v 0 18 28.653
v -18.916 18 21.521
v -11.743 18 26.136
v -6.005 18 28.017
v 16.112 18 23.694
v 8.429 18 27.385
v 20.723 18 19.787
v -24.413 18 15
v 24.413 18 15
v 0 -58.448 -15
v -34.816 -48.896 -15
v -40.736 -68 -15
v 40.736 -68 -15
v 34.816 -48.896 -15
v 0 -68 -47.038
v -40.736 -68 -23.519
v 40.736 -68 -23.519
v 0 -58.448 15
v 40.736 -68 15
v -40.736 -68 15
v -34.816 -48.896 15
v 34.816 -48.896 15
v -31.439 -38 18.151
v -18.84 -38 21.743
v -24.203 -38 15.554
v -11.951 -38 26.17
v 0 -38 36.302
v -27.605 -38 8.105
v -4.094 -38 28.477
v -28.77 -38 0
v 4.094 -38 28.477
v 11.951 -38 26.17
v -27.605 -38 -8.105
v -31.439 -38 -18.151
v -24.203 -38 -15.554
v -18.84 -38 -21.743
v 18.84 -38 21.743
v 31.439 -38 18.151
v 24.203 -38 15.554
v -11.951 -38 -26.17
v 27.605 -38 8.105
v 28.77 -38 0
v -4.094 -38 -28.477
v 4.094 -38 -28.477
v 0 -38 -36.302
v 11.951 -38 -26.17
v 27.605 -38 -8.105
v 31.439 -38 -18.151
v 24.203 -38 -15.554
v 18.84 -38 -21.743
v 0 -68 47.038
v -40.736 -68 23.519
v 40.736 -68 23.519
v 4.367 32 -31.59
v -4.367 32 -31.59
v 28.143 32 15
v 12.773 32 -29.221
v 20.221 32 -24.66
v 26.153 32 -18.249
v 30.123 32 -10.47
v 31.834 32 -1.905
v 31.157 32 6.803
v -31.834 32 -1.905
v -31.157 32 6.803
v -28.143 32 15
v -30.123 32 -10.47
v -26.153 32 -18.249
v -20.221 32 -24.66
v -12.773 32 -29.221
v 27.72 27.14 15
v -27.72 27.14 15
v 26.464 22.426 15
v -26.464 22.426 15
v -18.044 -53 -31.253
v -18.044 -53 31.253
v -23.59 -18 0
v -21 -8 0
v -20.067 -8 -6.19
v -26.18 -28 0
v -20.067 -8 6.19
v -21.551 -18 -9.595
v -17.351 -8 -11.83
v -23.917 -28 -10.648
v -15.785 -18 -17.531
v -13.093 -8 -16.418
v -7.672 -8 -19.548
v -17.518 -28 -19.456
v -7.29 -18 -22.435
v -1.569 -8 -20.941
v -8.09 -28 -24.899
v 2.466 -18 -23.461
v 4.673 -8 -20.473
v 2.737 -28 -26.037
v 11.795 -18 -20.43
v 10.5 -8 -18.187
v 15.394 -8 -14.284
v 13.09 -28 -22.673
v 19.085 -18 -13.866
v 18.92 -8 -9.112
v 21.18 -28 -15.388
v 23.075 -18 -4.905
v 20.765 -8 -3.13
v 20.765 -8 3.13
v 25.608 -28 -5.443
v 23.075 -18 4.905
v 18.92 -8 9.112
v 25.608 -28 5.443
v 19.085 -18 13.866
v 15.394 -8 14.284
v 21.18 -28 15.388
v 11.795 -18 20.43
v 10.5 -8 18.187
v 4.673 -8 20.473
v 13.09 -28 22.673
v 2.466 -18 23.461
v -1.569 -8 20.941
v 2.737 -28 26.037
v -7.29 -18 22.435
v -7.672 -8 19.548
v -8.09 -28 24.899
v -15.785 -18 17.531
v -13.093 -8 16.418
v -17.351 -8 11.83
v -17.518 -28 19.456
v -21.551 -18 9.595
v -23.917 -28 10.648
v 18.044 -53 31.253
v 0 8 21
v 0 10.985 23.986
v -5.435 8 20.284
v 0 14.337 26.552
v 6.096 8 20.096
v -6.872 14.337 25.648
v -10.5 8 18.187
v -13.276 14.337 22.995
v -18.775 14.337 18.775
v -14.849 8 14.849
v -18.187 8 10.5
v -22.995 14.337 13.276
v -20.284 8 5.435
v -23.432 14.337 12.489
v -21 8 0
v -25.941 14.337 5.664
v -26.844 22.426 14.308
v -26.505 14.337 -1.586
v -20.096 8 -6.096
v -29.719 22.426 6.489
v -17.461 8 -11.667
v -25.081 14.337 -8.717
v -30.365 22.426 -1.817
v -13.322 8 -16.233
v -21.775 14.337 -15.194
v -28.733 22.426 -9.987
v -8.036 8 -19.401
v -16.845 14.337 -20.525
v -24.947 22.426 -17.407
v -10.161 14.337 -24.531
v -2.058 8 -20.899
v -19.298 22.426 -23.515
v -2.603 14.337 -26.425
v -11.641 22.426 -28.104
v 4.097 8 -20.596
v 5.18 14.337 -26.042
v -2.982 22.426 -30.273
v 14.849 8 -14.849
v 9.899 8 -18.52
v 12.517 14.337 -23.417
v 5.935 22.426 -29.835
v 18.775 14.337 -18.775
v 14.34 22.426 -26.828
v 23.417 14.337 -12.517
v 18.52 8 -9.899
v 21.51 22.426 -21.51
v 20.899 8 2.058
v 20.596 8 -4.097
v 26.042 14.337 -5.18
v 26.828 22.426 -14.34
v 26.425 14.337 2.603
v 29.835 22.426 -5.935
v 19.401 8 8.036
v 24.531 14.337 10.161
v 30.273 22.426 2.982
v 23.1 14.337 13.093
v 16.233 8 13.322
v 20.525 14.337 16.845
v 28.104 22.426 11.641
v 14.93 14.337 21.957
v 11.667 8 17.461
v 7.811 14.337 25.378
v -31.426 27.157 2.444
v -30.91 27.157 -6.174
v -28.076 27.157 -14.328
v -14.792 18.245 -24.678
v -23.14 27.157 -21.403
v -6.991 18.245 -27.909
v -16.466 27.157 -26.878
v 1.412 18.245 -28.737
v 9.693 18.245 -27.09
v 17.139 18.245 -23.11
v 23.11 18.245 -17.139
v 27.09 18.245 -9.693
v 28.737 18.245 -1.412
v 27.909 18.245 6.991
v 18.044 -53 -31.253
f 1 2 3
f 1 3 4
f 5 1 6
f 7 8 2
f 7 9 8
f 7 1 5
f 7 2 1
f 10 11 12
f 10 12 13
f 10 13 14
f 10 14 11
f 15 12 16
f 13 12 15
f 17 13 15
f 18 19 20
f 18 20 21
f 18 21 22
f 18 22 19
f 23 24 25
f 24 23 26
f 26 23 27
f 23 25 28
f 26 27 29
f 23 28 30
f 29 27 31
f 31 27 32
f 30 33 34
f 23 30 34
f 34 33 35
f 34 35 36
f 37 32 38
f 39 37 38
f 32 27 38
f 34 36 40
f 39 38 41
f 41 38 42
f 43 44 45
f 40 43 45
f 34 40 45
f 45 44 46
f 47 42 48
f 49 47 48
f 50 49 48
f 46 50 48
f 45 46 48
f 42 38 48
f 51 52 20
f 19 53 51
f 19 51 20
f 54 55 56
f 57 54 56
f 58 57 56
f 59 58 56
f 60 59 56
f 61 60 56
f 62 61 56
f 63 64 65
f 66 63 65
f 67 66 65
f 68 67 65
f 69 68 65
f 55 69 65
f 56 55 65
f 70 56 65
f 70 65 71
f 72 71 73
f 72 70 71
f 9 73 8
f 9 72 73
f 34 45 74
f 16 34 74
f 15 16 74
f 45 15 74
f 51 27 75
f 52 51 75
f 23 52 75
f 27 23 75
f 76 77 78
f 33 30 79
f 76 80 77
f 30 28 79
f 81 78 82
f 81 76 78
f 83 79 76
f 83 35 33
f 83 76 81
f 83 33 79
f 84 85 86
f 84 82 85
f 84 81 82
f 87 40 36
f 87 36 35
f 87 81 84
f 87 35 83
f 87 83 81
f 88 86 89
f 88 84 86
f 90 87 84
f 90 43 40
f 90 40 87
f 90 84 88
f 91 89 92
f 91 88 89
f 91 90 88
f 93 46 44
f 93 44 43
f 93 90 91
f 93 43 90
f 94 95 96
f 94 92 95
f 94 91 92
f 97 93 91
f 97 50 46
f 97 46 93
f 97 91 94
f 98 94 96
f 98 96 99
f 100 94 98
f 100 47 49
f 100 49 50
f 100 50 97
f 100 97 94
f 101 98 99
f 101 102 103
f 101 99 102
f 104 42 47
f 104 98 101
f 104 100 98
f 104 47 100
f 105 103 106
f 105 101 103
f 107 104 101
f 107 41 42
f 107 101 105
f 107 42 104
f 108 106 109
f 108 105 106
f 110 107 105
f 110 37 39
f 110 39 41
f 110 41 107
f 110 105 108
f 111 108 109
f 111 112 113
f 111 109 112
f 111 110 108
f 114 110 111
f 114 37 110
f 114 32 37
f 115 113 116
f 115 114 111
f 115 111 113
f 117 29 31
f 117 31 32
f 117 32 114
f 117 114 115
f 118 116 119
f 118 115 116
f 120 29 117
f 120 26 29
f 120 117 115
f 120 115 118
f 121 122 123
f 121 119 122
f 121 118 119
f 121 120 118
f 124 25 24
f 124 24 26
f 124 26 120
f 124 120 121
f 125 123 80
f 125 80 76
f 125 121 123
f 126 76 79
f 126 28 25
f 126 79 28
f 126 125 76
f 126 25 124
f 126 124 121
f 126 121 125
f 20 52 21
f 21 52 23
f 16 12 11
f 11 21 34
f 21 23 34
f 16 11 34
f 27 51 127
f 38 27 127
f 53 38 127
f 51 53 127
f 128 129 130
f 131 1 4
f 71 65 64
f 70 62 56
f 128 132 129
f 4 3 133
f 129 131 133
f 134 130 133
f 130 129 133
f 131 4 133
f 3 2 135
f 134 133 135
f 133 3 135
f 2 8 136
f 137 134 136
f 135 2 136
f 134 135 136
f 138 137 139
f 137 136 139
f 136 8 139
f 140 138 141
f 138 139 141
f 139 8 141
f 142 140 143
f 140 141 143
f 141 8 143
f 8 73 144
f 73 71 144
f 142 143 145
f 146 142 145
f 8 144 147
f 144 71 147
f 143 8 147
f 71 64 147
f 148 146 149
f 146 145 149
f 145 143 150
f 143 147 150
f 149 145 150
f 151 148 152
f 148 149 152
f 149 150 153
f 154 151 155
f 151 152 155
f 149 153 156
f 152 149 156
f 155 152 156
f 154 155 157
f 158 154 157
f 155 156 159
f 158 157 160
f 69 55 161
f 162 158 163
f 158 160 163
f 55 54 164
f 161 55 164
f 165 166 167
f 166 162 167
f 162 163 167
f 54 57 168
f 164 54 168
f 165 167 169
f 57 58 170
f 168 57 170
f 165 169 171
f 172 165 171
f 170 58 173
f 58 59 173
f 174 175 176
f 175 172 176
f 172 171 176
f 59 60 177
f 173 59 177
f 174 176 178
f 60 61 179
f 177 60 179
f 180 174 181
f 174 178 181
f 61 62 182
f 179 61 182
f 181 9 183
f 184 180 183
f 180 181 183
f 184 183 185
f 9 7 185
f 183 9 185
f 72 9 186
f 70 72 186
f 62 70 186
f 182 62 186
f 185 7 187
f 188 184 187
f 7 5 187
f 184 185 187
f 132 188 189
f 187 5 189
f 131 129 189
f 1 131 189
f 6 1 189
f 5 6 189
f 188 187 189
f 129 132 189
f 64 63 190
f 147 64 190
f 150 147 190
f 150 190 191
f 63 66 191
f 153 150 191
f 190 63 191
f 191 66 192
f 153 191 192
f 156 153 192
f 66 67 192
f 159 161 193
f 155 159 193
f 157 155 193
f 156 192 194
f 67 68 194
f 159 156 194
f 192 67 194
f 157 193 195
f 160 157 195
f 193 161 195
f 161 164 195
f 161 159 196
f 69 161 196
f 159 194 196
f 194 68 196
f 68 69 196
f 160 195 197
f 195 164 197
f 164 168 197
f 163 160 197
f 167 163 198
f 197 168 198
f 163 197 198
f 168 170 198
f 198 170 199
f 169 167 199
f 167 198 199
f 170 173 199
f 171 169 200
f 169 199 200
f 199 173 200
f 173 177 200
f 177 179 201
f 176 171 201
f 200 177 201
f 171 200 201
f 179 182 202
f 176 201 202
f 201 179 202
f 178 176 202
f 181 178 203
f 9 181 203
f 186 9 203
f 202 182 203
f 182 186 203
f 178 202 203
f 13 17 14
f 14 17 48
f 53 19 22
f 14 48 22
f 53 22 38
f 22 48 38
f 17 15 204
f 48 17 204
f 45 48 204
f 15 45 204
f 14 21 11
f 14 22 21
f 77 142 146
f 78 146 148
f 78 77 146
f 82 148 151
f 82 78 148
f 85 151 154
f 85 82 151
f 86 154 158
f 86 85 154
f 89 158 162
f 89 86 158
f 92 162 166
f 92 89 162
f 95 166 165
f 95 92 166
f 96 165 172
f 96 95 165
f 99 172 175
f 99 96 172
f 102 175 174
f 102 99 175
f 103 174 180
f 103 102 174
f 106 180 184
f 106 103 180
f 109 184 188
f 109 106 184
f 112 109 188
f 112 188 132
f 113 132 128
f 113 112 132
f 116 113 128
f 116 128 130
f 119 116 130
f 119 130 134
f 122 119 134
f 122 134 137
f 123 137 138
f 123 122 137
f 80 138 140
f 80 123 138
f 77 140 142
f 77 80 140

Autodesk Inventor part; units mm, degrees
ref_plane "YZ Plane" through (0, 0, 0) normal (1, 0, 0) x (0, 1, 0)
ref_plane "XZ Plane" through (0, 0, 0) normal (0, 1, 0) x (-1, 0, 0)
ref_plane "XY Plane" through (0, 0, 0) normal (0, 0, 1) x (1, 0, 0)
sketch "Sketch2" plane through (0, 0, 0) normal (0, 1, 0) x (-1, 0, 0)
  circle A0 centre (0, 0) radius 21
  dimension "d1" = 42
extrude "Extrusion1" add sketch "Sketch2" along normal mid plane 16
sketch "Sketch3" plane through (0, -8, 0) normal (0, -1, 0) x (1, 0, 0)
  circle A0 centre (0, 0) radius 21
  dimension "d4" = 42
ref_plane "Work Plane1" through (0, -38, 0) normal (0, -1, 0) x (1, 0, 0)
sketch "Sketch4" plane through (0, -38, 0) normal (0, -1, 0) x (1, 0, 0)
  circle A0 centre (0, 0) radius 28.77
  dimension "d6" = 57.54
loft "Loft1" add profiles "Sketch4" section 1 edges at (21, -8, 0)
sketch "Sketch5" plane through (0, -38, 0) normal (0, -1, 0) x (1, 0, 0)
  circle A0 centre (0, 0) radius 28.77 projected
  line L0 (0, 0) -> (28.77, 0) construction
  line L1 (0, 36.3025) -> (31.4389, 18.1512)
  line L2 (31.4389, 18.1512) -> (31.4389, -18.1512)
  line L3 (31.4389, -18.1512) -> (0, -36.3025)
  line L4 (0, -36.3025) -> (-31.4389, -18.1512)
  line L5 (-31.4389, -18.1512) -> (-31.4389, 18.1512)
  line L6 (-31.4389, 18.1512) -> (0, 36.3025)
ref_plane "Work Plane2" through (0, -68, 0) normal (0, -1, 0) x (1, 0, 0)
sketch "Sketch6" plane through (0, -38, 0) normal (0, -1, 0) x (1, 0, 0)
  point P0 (0, 0)
sketch "Sketch8" plane through (0, -68, 0) normal (0, -1, 0) x (1, 0, 0)
  line L0 (0, 47.0378) -> (40.7359, 23.5189)
  line L1 (40.7359, 23.5189) -> (40.7359, -23.5189)
  line L2 (40.7359, -23.5189) -> (0, -47.0378)
  line L3 (0, -47.0378) -> (-40.7359, -23.5189)
  line L4 (-40.7359, -23.5189) -> (-40.7359, 23.5189)
  line L5 (-40.7359, 23.5189) -> (0, 47.0378)
  point P0 (0, 0)
  point P1 (0, 0)
loft "Loft3" add profiles "Sketch8", "Sketch5" contours all / A0 | L1 L2 L3 L4 L5 L6
sketch "Sketch9" plane through (-40.7359, -68, -23.5189) normal (-0.9551836, 0.296014, 0) x (0, 0, 1)
  line L0 (0, 0) -> (47.0378, 0) projected
  line L1 (23.5189, 0) -> (16.0189, 0)
  line L2 (31.0189, 0) -> (23.5189, 0)
  line L3 (31.0189, 0) -> (16.0189, 0)
  line L4 (16.0189, 20) -> (31.0189, 20)
  line L5 (23.5189, 0) -> (8.5189, 0)
  line L6 (8.5189, 0) -> (8.5189, 20)
  line L7 (8.5189, 20) -> (38.5189, 20)
  line L8 (38.5189, 20) -> (38.5189, 0)
  point P0 (23.5189, 77.0109)
  dimension "d40" = 15
  dimension "d41" = 20
  dimension "d42" = 30
sketch "Sketch10" plane through (40.7359, -68, 23.5189) normal (0.9551836, 0.296014, 0) x (0, 0, -1)
  line L0 (38.5189, 20) -> (38.5189, 0)
  line L1 (8.5189, 0) -> (8.5189, 20)
  line L2 (8.5189, 20) -> (38.5189, 20)
  line L3 (38.5189, 20) -> (38.5189, 0)
  line L4 (0, 0) -> (47.0378, 0) projected
  line L5 (8.5189, 0) -> (38.5189, 0)
  point P0 (23.5189, 77.0109)
  point P1 (23.5189, 0)
  point P2 (53.5189, 0)
  point P3 (23.5189, 0)
loft "Loft4" cut profiles "Sketch9", "Sketch10"
ref_plane "Work Plane4" through (0, 63.4475, -18.1512) normal (-1, 0, 0) x (0, 0, 1)
sketch "Sketch12" plane through (0, 63.4475, -18.1512) normal (-1, 0, 0) x (0, 0, 1)
  line L0 (39.1512, -55.4475) -> (-2.8488, -55.4475) projected
  line L1 (18.1512, -55.4475) -> (39.1512, -55.4475)
  arc A0 (39.1512, -55.4475) -> (50.0417, -31.4475) centre (18.1512, -31.4475) ccw
  line L2 (18.1512, -31.4475) -> (50.0417, -31.4475)
  line L3 (18.1512, -31.4475) -> (18.1512, -55.4475)
  line L4 (18.1512, -55.4475) -> (39.1512, -55.4475)
  point P0 (18.1512, -63.4475)
revolve "Revolution1" add sketch "Sketch12" angle 360 about axis through (0, 32, 0) along (0, -1, 0)
sketch "Sketch14" plane through (0, 63.4475, -18.1512) normal (-1, 0, 0) x (0, 0, 1)
  line L0 (-13.7392, -31.4475) -> (50.0417, -31.4475) projected
  line L1 (18.1512, -31.4475) -> (33.1512, -31.4475)
  line L2 (18.1512, -31.4475) -> (33.1512, -31.4475) construction
  line L3 (33.1512, -31.4475) -> (33.1512, -45.4475)
  line L4 (33.1512, -45.4475) -> (50.0417, -45.4475)
  line L5 (50.0417, -45.4475) -> (50.0417, -31.4475)
  line L6 (50.0417, -31.4475) -> (33.1512, -31.4475)
  point P0 (18.1512, -63.4475)
  point P1 (33.1512, -31.4475)
  dimension "d47" = 14
  dimension "d48" = 90
  dimension "d49" = 90
extrude "Extrusion2" cut sketch "Sketch14" along normal mid plane 70
